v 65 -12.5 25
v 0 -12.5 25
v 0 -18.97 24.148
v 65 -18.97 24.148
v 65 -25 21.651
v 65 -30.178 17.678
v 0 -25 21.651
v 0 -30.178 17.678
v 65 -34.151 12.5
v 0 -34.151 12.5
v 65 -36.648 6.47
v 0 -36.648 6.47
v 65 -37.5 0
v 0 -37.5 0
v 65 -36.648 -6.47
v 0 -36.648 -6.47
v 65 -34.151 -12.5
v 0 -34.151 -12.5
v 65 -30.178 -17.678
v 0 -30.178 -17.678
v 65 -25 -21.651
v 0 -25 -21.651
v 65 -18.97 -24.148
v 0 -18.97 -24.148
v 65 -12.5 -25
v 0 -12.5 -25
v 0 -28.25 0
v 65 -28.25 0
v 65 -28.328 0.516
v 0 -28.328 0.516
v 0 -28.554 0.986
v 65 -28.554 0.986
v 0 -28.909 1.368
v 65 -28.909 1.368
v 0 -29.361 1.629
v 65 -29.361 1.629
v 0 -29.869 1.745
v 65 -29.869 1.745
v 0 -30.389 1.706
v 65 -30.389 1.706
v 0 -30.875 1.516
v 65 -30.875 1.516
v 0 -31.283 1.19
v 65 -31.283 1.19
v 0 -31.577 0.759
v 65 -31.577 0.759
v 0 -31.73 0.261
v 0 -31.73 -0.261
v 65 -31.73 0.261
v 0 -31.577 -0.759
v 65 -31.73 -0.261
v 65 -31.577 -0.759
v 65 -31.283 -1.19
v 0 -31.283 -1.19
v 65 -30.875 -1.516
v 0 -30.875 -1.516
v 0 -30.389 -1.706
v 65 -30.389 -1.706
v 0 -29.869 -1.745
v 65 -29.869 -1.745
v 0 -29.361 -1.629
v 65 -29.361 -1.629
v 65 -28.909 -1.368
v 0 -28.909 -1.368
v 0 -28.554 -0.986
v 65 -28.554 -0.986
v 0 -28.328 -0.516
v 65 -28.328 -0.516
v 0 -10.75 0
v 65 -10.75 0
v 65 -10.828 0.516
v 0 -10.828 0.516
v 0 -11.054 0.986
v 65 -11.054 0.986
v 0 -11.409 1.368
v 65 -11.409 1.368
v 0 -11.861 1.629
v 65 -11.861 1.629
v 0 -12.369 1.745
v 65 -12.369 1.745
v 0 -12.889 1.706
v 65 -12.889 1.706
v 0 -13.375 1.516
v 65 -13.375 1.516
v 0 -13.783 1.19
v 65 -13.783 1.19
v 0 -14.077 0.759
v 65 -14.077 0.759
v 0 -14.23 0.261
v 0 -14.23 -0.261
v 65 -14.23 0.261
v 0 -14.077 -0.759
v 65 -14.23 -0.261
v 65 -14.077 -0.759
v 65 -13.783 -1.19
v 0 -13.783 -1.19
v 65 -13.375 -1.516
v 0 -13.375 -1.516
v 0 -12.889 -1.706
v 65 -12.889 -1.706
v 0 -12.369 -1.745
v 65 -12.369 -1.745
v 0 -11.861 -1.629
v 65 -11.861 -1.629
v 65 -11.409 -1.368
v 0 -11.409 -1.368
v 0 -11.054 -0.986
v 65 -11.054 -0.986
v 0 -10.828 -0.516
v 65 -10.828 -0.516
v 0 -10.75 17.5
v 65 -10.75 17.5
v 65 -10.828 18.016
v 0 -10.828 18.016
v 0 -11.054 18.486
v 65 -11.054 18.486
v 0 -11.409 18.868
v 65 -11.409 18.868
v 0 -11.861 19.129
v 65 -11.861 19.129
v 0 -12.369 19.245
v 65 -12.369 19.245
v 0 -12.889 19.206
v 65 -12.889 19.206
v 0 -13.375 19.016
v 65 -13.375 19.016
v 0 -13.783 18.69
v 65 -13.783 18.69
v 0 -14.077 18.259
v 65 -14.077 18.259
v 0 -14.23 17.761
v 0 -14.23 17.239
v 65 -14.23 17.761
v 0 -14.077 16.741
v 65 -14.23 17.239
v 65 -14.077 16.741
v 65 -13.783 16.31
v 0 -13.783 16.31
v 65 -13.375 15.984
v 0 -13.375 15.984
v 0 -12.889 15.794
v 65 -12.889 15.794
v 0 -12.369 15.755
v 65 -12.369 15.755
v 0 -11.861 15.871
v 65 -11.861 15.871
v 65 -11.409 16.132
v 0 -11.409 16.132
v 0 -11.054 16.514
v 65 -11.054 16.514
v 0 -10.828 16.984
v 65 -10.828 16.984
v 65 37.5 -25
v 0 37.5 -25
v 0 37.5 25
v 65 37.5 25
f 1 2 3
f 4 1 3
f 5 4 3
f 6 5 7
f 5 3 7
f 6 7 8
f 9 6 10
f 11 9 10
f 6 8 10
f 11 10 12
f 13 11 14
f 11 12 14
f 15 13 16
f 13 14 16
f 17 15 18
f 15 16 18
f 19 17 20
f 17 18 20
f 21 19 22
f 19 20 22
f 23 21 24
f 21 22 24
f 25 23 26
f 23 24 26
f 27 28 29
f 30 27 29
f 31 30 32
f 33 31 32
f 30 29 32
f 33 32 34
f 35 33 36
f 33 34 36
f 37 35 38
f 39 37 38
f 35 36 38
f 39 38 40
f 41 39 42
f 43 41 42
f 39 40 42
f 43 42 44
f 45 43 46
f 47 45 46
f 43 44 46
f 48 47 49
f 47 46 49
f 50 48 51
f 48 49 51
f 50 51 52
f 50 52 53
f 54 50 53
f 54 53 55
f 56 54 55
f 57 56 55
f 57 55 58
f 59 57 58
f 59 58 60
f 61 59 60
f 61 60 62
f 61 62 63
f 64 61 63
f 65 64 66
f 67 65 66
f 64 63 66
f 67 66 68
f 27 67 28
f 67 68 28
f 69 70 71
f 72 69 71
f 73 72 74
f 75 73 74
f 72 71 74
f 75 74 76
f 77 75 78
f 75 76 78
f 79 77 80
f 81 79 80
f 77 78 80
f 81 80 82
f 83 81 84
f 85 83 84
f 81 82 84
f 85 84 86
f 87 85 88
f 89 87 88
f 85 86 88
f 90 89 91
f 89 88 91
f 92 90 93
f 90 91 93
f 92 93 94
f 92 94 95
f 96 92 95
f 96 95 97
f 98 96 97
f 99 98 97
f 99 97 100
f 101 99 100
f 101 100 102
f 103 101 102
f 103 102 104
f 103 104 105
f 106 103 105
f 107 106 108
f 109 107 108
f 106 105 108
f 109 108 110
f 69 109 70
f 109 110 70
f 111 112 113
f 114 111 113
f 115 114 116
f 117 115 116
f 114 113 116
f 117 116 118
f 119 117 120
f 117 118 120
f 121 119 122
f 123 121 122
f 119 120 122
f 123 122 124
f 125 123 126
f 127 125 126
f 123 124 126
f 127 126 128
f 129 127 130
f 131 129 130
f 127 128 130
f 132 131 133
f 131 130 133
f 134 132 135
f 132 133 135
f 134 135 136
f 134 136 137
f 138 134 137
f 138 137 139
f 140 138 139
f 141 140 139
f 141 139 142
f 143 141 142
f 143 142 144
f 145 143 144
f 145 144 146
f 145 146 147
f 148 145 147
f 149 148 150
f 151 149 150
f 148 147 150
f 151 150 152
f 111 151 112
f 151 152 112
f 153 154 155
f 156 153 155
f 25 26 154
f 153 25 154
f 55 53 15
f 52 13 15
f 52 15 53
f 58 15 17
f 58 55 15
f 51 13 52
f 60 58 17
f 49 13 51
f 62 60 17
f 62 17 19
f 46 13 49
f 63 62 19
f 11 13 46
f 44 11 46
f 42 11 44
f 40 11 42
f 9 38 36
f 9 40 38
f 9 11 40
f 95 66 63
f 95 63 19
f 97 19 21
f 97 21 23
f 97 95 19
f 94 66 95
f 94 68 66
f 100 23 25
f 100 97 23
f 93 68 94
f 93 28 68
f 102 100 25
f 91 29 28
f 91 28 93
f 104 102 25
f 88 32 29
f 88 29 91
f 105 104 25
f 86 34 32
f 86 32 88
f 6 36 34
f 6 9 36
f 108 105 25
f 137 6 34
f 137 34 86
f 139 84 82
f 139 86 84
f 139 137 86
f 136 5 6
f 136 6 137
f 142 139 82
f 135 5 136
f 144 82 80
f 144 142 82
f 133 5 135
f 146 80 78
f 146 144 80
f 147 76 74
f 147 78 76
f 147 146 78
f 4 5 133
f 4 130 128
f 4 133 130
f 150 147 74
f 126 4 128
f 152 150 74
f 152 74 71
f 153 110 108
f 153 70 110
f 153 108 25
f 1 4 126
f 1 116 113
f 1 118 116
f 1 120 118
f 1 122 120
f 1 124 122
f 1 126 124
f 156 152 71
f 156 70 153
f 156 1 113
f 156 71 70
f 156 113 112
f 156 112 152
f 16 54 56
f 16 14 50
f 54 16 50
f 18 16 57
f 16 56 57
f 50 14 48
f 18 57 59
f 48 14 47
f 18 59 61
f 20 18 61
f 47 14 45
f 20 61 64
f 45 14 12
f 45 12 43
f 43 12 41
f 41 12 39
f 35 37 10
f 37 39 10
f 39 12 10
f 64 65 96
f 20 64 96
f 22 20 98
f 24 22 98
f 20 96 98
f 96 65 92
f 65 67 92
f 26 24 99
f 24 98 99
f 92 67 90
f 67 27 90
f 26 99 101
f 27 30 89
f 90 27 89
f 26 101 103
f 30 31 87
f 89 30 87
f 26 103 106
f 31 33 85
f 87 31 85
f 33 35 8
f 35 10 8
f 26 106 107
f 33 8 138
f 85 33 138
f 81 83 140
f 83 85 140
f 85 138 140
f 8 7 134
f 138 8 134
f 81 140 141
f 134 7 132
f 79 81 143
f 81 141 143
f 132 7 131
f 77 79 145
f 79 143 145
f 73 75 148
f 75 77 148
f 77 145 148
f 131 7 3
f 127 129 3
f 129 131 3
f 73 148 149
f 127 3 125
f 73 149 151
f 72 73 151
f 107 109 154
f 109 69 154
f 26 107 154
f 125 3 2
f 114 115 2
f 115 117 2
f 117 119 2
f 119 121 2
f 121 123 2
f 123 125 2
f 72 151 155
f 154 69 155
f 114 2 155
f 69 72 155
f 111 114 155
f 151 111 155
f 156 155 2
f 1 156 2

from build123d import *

# Parameters (mm, degrees)
F1_DEPTH = 65
F2_R     = 1.75
F3_DEPTH = 65


with BuildPart() as f1:
    # F0 (on Right) → F1 (new body)
    with BuildSketch(Plane.YZ):
        with BuildLine():
            Line((37.5, -25), (37.5, 25))
            Line((37.5, 25), (-12.5, 25))
            ThreePointArc((-12.5, 25), (-37.5, 0), (-12.5, -25))
            Line((-12.5, -25), (37.5, -25))
        make_face()
    extrude(amount=F1_DEPTH)

    # F2 (on face) → F3 (cut)
    with BuildSketch(Plane.YZ.offset(65)):
        with Locations((-12.5, 0)):
            Circle(F2_R)
        with Locations((-12.5, 17.5)):
            Circle(F2_R)
        with Locations((-30, 0)):
            Circle(F2_R)
    extrude(amount=-F3_DEPTH, mode=Mode.SUBTRACT)


solid = f1.part
